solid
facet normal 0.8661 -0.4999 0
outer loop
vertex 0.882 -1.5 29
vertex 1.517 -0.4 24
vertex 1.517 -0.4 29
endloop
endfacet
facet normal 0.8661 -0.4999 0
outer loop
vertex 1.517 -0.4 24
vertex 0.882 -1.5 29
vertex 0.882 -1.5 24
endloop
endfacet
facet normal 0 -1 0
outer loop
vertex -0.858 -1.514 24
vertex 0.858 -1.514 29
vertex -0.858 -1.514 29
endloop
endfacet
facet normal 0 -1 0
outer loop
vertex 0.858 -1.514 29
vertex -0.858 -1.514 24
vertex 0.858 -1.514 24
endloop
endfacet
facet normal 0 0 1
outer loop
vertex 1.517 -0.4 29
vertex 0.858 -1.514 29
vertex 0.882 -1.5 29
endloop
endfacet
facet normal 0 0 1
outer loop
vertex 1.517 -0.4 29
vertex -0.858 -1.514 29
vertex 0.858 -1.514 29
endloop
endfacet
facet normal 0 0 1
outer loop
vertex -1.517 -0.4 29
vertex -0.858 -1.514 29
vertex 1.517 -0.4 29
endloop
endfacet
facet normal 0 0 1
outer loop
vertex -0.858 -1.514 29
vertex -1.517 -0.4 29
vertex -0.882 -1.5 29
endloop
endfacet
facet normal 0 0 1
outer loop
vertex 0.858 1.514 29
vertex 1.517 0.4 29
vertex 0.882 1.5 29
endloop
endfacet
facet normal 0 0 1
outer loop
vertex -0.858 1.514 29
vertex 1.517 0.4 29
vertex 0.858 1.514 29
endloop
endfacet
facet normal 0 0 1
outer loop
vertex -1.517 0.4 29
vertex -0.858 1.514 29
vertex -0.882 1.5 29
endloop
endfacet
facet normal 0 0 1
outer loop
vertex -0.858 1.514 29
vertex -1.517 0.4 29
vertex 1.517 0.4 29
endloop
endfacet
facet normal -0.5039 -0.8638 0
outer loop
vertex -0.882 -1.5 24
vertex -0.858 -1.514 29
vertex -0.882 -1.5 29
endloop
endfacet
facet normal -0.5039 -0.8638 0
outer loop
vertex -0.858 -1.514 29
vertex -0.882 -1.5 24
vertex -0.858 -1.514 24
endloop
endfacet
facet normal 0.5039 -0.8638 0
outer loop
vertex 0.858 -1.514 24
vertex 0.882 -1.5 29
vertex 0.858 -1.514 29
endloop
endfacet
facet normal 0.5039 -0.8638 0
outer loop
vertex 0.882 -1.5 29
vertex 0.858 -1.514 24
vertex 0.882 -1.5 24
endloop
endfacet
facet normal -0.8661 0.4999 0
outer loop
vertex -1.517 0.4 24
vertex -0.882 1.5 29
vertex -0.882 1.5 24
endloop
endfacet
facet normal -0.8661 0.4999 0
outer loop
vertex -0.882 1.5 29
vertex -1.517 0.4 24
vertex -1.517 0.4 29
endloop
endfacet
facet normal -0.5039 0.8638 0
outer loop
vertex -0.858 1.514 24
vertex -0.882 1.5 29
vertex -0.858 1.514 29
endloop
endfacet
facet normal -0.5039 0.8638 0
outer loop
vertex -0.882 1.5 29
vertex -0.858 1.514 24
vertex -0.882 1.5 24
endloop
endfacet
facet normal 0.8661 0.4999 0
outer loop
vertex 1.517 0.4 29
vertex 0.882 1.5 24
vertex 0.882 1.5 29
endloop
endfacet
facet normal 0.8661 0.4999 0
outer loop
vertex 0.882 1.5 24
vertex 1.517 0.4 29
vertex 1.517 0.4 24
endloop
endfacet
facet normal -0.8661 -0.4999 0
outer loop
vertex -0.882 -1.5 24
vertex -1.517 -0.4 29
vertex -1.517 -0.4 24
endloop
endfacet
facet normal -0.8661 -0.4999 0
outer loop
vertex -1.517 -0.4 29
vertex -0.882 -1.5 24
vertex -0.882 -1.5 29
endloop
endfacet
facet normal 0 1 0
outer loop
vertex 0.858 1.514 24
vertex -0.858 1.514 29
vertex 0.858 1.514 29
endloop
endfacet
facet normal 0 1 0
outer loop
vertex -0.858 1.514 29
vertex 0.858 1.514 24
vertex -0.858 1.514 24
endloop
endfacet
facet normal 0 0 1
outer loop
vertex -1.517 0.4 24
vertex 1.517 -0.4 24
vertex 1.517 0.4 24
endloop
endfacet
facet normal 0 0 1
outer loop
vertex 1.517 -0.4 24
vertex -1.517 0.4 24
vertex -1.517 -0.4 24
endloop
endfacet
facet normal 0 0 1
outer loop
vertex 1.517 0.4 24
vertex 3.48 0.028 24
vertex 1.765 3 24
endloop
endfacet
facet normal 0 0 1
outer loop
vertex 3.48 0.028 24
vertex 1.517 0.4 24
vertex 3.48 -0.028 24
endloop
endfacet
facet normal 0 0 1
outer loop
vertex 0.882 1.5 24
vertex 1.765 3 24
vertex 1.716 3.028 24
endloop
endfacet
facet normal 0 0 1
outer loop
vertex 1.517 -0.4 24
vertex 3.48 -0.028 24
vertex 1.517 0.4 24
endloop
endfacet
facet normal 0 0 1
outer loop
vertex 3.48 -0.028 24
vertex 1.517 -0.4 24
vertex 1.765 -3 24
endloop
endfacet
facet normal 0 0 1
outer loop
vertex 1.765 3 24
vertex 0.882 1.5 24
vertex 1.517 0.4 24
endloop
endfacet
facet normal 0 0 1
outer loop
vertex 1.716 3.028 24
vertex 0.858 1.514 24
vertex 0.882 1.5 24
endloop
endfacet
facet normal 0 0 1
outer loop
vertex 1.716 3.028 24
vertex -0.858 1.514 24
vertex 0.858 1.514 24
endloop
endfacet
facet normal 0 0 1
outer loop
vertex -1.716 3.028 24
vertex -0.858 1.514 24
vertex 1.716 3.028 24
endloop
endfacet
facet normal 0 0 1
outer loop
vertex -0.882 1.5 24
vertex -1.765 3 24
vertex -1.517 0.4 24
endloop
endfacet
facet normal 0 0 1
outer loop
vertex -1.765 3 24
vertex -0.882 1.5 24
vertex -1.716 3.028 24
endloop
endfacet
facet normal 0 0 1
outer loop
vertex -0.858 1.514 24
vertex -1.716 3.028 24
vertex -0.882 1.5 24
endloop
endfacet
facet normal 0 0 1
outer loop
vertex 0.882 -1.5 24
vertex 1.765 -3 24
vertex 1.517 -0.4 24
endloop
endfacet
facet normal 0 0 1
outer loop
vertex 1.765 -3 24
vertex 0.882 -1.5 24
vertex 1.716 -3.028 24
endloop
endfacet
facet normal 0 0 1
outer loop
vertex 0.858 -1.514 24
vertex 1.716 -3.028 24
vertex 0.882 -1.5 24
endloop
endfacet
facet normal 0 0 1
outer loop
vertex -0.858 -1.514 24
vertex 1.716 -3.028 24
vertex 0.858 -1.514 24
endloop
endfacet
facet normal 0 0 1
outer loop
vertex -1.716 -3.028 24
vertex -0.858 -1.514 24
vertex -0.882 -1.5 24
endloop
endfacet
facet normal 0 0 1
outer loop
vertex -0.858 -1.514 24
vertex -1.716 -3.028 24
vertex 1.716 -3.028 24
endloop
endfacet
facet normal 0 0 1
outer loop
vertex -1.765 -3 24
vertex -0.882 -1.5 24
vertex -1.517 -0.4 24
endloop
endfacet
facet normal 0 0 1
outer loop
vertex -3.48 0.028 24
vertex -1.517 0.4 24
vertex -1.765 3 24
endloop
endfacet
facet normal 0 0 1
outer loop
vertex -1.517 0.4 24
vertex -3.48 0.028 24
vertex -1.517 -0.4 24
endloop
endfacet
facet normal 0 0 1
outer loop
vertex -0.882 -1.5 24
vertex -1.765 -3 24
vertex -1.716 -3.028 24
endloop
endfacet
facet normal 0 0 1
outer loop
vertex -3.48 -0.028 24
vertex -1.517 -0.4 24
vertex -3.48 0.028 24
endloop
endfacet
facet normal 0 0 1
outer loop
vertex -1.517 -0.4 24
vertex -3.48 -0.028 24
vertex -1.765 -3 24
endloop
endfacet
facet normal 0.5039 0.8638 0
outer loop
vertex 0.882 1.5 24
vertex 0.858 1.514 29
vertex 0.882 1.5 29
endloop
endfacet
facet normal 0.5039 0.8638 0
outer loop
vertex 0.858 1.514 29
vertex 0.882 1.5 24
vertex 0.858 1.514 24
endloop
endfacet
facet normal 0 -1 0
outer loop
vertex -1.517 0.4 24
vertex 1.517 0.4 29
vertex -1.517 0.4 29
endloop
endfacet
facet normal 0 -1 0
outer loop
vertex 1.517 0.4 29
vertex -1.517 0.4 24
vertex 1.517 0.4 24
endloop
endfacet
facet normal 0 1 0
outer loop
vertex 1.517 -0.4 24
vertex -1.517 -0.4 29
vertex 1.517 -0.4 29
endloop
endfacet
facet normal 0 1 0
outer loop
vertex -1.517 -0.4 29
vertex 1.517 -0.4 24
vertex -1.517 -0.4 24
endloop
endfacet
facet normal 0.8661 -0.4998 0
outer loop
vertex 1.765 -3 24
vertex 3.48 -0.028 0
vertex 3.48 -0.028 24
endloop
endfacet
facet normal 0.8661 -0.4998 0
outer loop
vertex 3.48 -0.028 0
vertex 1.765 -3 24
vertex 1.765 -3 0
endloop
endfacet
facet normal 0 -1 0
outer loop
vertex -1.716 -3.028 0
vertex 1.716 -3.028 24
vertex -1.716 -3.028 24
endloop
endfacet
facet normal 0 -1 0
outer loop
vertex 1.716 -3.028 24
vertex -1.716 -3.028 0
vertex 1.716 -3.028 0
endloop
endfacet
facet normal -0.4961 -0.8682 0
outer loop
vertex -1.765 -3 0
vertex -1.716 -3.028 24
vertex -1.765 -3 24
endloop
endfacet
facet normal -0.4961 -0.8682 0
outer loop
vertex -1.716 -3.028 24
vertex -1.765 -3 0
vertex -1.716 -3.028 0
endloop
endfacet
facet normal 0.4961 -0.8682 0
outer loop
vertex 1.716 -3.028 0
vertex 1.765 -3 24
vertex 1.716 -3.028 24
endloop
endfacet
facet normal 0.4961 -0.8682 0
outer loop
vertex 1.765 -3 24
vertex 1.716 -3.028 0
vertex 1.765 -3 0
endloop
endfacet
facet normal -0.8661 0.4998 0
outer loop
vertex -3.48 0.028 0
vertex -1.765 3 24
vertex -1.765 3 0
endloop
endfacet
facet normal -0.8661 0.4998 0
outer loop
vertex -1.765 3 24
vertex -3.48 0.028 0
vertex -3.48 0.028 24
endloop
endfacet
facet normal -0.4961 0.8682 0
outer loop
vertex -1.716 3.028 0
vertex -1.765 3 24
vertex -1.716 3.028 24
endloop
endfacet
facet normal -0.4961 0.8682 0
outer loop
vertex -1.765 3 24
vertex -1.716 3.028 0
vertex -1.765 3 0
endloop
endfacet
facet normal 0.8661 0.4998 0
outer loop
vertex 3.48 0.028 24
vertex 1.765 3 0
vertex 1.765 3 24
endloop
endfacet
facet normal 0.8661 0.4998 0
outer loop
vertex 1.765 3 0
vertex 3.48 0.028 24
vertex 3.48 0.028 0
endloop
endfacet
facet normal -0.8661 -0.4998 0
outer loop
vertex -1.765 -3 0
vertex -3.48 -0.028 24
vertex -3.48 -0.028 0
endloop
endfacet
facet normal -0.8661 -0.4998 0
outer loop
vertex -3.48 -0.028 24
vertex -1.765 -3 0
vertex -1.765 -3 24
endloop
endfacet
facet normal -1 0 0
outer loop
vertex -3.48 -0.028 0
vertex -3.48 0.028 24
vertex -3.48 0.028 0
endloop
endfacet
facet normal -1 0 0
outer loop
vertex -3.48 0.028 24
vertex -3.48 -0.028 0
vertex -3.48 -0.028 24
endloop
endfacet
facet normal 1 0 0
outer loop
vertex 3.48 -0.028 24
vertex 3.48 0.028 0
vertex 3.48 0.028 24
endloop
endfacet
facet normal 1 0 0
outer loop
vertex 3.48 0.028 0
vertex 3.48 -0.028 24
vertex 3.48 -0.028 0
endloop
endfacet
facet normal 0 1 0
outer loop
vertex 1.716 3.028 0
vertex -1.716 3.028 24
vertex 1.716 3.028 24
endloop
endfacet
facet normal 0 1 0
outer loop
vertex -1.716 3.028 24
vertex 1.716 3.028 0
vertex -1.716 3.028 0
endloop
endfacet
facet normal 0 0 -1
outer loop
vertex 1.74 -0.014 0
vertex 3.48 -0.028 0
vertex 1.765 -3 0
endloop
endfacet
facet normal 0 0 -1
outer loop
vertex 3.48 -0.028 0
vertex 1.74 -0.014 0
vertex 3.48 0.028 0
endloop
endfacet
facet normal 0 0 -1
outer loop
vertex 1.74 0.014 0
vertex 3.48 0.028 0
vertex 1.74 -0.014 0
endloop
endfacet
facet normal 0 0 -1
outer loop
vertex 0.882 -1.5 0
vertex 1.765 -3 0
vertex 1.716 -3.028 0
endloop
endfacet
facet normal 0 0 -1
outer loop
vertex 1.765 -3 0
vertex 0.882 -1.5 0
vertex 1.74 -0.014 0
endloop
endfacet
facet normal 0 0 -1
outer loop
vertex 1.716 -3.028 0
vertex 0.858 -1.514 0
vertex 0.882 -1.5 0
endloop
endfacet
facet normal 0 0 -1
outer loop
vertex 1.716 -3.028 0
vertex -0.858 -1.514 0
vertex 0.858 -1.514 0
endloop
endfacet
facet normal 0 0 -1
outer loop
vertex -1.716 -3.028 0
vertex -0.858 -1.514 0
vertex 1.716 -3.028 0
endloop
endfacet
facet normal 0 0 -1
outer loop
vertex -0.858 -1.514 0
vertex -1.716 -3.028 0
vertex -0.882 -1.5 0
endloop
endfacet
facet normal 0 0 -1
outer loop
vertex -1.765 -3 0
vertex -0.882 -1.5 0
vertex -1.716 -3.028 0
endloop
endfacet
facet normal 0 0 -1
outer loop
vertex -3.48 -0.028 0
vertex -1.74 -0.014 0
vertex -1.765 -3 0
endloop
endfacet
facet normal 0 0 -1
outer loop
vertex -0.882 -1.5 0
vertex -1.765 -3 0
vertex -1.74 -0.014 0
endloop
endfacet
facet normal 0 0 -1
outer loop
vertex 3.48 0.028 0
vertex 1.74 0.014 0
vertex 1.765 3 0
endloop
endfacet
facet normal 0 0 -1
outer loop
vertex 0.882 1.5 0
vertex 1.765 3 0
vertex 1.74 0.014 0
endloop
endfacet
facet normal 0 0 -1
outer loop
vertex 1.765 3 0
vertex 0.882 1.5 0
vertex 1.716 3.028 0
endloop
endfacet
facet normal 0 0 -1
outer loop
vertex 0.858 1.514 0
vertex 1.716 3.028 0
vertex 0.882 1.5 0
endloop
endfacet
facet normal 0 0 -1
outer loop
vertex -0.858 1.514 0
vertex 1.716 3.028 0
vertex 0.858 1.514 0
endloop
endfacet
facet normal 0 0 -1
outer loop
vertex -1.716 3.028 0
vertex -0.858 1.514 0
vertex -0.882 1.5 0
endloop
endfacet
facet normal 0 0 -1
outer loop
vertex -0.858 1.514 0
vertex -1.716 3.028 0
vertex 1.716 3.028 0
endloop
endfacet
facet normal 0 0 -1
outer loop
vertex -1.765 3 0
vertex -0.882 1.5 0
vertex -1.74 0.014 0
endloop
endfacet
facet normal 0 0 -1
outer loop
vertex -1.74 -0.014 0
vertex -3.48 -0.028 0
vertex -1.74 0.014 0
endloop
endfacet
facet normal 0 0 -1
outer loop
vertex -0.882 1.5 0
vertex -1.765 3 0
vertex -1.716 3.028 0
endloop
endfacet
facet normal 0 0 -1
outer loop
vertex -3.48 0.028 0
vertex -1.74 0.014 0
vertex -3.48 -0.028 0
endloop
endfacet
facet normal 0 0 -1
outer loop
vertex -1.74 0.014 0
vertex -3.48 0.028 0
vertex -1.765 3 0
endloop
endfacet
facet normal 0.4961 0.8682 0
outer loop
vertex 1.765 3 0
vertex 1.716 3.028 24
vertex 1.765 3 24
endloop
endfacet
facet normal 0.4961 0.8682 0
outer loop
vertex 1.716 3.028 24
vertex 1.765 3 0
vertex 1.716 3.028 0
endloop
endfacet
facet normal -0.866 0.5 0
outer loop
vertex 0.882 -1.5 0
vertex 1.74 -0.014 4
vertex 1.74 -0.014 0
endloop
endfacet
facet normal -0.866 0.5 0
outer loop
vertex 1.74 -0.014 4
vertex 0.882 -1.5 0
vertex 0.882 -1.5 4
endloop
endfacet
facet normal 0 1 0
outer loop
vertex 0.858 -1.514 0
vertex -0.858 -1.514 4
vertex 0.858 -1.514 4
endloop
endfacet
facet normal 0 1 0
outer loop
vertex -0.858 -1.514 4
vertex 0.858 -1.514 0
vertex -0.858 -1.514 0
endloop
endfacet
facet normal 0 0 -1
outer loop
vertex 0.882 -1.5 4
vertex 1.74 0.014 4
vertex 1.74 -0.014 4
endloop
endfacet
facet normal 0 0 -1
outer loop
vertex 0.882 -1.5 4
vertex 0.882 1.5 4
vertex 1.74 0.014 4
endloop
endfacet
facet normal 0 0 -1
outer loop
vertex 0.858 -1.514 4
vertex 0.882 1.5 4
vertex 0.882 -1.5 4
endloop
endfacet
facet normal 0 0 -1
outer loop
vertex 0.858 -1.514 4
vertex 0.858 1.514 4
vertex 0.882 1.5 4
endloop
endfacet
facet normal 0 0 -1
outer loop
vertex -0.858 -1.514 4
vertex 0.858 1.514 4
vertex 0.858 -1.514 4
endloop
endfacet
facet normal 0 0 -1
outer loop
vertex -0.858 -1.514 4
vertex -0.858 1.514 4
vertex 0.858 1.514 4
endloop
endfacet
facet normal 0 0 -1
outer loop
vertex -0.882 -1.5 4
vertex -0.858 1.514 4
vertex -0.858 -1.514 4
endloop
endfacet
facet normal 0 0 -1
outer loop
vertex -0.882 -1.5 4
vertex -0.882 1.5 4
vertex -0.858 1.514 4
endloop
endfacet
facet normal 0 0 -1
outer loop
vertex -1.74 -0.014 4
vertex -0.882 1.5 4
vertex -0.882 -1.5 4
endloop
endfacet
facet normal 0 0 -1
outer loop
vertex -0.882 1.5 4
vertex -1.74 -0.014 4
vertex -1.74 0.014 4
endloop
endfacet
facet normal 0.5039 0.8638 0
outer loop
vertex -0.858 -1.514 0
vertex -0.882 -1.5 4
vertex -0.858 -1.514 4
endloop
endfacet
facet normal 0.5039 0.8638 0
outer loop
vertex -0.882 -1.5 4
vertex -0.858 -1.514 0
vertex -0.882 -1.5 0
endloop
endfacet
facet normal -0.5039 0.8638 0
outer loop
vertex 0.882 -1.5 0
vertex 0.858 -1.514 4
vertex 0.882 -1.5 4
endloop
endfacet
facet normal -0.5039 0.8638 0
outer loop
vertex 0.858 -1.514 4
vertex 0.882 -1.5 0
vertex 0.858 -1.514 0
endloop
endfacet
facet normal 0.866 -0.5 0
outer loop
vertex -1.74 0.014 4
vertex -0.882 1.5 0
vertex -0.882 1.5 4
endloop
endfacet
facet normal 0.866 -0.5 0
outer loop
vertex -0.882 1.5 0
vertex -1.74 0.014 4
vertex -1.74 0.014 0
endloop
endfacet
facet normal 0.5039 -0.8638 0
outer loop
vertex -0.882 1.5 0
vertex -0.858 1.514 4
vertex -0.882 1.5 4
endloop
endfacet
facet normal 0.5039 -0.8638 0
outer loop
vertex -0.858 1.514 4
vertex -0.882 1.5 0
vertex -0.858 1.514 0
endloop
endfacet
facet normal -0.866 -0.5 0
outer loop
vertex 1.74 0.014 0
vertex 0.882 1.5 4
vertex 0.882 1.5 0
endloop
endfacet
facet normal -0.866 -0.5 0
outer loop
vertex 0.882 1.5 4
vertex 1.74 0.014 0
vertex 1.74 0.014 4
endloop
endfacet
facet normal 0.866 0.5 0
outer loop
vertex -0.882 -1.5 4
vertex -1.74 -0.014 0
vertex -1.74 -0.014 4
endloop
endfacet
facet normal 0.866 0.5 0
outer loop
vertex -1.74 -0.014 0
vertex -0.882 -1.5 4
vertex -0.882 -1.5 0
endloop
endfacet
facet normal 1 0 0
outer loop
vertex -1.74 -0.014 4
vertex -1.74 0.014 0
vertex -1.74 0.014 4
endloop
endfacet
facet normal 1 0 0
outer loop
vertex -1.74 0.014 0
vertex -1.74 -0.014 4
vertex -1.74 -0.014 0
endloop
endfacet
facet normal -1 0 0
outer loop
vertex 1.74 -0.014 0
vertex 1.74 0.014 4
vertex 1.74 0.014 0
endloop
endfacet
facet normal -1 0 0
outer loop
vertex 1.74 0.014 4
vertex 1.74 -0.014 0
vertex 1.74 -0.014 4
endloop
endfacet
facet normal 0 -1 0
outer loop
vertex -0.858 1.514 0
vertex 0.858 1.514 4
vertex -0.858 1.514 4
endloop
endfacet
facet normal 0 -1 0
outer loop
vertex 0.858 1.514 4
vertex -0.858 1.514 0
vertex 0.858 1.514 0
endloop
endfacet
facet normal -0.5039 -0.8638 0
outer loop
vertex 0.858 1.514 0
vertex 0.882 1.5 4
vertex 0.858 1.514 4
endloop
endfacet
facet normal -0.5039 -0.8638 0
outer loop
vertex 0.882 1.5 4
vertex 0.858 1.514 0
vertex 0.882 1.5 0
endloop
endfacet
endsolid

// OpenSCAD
standoff_base_height=24;
standoff_base_diameter=6;

standoff_pin_height=5;
standoff_pin_diameter=3;

pin_split_width=0.8;

show_pin=true;

bottom_hole_height=4;
bottom_hole_diameter=3;

union() {
    if (show_pin) {
        translate([0, 0, standoff_base_height+standoff_pin_height/2]) post();
    }

    difference() {
        translate([0, 0, standoff_base_height/2]) hex(standoff_base_diameter, standoff_base_height);
        
        if (show_pin) {
            hex(bottom_hole_diameter, bottom_hole_height*2);
        } else {
            hex(bottom_hole_diameter, standoff_base_height*2);
        }
    }
}

module post() {
    difference() {
        hex(standoff_pin_diameter, standoff_pin_height);
        cube([standoff_pin_diameter+1, pin_split_width, standoff_pin_height], true);
    }
}

// From https://www.youtube.com/watch?v=KAKEk1falNg
module hex(width,height){
    hull() {
        cube([width/1.7,width,height],center = true);
        rotate([0,0,120])cube([width/1.7,width,height],center = true);
        rotate([0,0,240])cube([width/1.7,width,height],center = true);
    }
}
